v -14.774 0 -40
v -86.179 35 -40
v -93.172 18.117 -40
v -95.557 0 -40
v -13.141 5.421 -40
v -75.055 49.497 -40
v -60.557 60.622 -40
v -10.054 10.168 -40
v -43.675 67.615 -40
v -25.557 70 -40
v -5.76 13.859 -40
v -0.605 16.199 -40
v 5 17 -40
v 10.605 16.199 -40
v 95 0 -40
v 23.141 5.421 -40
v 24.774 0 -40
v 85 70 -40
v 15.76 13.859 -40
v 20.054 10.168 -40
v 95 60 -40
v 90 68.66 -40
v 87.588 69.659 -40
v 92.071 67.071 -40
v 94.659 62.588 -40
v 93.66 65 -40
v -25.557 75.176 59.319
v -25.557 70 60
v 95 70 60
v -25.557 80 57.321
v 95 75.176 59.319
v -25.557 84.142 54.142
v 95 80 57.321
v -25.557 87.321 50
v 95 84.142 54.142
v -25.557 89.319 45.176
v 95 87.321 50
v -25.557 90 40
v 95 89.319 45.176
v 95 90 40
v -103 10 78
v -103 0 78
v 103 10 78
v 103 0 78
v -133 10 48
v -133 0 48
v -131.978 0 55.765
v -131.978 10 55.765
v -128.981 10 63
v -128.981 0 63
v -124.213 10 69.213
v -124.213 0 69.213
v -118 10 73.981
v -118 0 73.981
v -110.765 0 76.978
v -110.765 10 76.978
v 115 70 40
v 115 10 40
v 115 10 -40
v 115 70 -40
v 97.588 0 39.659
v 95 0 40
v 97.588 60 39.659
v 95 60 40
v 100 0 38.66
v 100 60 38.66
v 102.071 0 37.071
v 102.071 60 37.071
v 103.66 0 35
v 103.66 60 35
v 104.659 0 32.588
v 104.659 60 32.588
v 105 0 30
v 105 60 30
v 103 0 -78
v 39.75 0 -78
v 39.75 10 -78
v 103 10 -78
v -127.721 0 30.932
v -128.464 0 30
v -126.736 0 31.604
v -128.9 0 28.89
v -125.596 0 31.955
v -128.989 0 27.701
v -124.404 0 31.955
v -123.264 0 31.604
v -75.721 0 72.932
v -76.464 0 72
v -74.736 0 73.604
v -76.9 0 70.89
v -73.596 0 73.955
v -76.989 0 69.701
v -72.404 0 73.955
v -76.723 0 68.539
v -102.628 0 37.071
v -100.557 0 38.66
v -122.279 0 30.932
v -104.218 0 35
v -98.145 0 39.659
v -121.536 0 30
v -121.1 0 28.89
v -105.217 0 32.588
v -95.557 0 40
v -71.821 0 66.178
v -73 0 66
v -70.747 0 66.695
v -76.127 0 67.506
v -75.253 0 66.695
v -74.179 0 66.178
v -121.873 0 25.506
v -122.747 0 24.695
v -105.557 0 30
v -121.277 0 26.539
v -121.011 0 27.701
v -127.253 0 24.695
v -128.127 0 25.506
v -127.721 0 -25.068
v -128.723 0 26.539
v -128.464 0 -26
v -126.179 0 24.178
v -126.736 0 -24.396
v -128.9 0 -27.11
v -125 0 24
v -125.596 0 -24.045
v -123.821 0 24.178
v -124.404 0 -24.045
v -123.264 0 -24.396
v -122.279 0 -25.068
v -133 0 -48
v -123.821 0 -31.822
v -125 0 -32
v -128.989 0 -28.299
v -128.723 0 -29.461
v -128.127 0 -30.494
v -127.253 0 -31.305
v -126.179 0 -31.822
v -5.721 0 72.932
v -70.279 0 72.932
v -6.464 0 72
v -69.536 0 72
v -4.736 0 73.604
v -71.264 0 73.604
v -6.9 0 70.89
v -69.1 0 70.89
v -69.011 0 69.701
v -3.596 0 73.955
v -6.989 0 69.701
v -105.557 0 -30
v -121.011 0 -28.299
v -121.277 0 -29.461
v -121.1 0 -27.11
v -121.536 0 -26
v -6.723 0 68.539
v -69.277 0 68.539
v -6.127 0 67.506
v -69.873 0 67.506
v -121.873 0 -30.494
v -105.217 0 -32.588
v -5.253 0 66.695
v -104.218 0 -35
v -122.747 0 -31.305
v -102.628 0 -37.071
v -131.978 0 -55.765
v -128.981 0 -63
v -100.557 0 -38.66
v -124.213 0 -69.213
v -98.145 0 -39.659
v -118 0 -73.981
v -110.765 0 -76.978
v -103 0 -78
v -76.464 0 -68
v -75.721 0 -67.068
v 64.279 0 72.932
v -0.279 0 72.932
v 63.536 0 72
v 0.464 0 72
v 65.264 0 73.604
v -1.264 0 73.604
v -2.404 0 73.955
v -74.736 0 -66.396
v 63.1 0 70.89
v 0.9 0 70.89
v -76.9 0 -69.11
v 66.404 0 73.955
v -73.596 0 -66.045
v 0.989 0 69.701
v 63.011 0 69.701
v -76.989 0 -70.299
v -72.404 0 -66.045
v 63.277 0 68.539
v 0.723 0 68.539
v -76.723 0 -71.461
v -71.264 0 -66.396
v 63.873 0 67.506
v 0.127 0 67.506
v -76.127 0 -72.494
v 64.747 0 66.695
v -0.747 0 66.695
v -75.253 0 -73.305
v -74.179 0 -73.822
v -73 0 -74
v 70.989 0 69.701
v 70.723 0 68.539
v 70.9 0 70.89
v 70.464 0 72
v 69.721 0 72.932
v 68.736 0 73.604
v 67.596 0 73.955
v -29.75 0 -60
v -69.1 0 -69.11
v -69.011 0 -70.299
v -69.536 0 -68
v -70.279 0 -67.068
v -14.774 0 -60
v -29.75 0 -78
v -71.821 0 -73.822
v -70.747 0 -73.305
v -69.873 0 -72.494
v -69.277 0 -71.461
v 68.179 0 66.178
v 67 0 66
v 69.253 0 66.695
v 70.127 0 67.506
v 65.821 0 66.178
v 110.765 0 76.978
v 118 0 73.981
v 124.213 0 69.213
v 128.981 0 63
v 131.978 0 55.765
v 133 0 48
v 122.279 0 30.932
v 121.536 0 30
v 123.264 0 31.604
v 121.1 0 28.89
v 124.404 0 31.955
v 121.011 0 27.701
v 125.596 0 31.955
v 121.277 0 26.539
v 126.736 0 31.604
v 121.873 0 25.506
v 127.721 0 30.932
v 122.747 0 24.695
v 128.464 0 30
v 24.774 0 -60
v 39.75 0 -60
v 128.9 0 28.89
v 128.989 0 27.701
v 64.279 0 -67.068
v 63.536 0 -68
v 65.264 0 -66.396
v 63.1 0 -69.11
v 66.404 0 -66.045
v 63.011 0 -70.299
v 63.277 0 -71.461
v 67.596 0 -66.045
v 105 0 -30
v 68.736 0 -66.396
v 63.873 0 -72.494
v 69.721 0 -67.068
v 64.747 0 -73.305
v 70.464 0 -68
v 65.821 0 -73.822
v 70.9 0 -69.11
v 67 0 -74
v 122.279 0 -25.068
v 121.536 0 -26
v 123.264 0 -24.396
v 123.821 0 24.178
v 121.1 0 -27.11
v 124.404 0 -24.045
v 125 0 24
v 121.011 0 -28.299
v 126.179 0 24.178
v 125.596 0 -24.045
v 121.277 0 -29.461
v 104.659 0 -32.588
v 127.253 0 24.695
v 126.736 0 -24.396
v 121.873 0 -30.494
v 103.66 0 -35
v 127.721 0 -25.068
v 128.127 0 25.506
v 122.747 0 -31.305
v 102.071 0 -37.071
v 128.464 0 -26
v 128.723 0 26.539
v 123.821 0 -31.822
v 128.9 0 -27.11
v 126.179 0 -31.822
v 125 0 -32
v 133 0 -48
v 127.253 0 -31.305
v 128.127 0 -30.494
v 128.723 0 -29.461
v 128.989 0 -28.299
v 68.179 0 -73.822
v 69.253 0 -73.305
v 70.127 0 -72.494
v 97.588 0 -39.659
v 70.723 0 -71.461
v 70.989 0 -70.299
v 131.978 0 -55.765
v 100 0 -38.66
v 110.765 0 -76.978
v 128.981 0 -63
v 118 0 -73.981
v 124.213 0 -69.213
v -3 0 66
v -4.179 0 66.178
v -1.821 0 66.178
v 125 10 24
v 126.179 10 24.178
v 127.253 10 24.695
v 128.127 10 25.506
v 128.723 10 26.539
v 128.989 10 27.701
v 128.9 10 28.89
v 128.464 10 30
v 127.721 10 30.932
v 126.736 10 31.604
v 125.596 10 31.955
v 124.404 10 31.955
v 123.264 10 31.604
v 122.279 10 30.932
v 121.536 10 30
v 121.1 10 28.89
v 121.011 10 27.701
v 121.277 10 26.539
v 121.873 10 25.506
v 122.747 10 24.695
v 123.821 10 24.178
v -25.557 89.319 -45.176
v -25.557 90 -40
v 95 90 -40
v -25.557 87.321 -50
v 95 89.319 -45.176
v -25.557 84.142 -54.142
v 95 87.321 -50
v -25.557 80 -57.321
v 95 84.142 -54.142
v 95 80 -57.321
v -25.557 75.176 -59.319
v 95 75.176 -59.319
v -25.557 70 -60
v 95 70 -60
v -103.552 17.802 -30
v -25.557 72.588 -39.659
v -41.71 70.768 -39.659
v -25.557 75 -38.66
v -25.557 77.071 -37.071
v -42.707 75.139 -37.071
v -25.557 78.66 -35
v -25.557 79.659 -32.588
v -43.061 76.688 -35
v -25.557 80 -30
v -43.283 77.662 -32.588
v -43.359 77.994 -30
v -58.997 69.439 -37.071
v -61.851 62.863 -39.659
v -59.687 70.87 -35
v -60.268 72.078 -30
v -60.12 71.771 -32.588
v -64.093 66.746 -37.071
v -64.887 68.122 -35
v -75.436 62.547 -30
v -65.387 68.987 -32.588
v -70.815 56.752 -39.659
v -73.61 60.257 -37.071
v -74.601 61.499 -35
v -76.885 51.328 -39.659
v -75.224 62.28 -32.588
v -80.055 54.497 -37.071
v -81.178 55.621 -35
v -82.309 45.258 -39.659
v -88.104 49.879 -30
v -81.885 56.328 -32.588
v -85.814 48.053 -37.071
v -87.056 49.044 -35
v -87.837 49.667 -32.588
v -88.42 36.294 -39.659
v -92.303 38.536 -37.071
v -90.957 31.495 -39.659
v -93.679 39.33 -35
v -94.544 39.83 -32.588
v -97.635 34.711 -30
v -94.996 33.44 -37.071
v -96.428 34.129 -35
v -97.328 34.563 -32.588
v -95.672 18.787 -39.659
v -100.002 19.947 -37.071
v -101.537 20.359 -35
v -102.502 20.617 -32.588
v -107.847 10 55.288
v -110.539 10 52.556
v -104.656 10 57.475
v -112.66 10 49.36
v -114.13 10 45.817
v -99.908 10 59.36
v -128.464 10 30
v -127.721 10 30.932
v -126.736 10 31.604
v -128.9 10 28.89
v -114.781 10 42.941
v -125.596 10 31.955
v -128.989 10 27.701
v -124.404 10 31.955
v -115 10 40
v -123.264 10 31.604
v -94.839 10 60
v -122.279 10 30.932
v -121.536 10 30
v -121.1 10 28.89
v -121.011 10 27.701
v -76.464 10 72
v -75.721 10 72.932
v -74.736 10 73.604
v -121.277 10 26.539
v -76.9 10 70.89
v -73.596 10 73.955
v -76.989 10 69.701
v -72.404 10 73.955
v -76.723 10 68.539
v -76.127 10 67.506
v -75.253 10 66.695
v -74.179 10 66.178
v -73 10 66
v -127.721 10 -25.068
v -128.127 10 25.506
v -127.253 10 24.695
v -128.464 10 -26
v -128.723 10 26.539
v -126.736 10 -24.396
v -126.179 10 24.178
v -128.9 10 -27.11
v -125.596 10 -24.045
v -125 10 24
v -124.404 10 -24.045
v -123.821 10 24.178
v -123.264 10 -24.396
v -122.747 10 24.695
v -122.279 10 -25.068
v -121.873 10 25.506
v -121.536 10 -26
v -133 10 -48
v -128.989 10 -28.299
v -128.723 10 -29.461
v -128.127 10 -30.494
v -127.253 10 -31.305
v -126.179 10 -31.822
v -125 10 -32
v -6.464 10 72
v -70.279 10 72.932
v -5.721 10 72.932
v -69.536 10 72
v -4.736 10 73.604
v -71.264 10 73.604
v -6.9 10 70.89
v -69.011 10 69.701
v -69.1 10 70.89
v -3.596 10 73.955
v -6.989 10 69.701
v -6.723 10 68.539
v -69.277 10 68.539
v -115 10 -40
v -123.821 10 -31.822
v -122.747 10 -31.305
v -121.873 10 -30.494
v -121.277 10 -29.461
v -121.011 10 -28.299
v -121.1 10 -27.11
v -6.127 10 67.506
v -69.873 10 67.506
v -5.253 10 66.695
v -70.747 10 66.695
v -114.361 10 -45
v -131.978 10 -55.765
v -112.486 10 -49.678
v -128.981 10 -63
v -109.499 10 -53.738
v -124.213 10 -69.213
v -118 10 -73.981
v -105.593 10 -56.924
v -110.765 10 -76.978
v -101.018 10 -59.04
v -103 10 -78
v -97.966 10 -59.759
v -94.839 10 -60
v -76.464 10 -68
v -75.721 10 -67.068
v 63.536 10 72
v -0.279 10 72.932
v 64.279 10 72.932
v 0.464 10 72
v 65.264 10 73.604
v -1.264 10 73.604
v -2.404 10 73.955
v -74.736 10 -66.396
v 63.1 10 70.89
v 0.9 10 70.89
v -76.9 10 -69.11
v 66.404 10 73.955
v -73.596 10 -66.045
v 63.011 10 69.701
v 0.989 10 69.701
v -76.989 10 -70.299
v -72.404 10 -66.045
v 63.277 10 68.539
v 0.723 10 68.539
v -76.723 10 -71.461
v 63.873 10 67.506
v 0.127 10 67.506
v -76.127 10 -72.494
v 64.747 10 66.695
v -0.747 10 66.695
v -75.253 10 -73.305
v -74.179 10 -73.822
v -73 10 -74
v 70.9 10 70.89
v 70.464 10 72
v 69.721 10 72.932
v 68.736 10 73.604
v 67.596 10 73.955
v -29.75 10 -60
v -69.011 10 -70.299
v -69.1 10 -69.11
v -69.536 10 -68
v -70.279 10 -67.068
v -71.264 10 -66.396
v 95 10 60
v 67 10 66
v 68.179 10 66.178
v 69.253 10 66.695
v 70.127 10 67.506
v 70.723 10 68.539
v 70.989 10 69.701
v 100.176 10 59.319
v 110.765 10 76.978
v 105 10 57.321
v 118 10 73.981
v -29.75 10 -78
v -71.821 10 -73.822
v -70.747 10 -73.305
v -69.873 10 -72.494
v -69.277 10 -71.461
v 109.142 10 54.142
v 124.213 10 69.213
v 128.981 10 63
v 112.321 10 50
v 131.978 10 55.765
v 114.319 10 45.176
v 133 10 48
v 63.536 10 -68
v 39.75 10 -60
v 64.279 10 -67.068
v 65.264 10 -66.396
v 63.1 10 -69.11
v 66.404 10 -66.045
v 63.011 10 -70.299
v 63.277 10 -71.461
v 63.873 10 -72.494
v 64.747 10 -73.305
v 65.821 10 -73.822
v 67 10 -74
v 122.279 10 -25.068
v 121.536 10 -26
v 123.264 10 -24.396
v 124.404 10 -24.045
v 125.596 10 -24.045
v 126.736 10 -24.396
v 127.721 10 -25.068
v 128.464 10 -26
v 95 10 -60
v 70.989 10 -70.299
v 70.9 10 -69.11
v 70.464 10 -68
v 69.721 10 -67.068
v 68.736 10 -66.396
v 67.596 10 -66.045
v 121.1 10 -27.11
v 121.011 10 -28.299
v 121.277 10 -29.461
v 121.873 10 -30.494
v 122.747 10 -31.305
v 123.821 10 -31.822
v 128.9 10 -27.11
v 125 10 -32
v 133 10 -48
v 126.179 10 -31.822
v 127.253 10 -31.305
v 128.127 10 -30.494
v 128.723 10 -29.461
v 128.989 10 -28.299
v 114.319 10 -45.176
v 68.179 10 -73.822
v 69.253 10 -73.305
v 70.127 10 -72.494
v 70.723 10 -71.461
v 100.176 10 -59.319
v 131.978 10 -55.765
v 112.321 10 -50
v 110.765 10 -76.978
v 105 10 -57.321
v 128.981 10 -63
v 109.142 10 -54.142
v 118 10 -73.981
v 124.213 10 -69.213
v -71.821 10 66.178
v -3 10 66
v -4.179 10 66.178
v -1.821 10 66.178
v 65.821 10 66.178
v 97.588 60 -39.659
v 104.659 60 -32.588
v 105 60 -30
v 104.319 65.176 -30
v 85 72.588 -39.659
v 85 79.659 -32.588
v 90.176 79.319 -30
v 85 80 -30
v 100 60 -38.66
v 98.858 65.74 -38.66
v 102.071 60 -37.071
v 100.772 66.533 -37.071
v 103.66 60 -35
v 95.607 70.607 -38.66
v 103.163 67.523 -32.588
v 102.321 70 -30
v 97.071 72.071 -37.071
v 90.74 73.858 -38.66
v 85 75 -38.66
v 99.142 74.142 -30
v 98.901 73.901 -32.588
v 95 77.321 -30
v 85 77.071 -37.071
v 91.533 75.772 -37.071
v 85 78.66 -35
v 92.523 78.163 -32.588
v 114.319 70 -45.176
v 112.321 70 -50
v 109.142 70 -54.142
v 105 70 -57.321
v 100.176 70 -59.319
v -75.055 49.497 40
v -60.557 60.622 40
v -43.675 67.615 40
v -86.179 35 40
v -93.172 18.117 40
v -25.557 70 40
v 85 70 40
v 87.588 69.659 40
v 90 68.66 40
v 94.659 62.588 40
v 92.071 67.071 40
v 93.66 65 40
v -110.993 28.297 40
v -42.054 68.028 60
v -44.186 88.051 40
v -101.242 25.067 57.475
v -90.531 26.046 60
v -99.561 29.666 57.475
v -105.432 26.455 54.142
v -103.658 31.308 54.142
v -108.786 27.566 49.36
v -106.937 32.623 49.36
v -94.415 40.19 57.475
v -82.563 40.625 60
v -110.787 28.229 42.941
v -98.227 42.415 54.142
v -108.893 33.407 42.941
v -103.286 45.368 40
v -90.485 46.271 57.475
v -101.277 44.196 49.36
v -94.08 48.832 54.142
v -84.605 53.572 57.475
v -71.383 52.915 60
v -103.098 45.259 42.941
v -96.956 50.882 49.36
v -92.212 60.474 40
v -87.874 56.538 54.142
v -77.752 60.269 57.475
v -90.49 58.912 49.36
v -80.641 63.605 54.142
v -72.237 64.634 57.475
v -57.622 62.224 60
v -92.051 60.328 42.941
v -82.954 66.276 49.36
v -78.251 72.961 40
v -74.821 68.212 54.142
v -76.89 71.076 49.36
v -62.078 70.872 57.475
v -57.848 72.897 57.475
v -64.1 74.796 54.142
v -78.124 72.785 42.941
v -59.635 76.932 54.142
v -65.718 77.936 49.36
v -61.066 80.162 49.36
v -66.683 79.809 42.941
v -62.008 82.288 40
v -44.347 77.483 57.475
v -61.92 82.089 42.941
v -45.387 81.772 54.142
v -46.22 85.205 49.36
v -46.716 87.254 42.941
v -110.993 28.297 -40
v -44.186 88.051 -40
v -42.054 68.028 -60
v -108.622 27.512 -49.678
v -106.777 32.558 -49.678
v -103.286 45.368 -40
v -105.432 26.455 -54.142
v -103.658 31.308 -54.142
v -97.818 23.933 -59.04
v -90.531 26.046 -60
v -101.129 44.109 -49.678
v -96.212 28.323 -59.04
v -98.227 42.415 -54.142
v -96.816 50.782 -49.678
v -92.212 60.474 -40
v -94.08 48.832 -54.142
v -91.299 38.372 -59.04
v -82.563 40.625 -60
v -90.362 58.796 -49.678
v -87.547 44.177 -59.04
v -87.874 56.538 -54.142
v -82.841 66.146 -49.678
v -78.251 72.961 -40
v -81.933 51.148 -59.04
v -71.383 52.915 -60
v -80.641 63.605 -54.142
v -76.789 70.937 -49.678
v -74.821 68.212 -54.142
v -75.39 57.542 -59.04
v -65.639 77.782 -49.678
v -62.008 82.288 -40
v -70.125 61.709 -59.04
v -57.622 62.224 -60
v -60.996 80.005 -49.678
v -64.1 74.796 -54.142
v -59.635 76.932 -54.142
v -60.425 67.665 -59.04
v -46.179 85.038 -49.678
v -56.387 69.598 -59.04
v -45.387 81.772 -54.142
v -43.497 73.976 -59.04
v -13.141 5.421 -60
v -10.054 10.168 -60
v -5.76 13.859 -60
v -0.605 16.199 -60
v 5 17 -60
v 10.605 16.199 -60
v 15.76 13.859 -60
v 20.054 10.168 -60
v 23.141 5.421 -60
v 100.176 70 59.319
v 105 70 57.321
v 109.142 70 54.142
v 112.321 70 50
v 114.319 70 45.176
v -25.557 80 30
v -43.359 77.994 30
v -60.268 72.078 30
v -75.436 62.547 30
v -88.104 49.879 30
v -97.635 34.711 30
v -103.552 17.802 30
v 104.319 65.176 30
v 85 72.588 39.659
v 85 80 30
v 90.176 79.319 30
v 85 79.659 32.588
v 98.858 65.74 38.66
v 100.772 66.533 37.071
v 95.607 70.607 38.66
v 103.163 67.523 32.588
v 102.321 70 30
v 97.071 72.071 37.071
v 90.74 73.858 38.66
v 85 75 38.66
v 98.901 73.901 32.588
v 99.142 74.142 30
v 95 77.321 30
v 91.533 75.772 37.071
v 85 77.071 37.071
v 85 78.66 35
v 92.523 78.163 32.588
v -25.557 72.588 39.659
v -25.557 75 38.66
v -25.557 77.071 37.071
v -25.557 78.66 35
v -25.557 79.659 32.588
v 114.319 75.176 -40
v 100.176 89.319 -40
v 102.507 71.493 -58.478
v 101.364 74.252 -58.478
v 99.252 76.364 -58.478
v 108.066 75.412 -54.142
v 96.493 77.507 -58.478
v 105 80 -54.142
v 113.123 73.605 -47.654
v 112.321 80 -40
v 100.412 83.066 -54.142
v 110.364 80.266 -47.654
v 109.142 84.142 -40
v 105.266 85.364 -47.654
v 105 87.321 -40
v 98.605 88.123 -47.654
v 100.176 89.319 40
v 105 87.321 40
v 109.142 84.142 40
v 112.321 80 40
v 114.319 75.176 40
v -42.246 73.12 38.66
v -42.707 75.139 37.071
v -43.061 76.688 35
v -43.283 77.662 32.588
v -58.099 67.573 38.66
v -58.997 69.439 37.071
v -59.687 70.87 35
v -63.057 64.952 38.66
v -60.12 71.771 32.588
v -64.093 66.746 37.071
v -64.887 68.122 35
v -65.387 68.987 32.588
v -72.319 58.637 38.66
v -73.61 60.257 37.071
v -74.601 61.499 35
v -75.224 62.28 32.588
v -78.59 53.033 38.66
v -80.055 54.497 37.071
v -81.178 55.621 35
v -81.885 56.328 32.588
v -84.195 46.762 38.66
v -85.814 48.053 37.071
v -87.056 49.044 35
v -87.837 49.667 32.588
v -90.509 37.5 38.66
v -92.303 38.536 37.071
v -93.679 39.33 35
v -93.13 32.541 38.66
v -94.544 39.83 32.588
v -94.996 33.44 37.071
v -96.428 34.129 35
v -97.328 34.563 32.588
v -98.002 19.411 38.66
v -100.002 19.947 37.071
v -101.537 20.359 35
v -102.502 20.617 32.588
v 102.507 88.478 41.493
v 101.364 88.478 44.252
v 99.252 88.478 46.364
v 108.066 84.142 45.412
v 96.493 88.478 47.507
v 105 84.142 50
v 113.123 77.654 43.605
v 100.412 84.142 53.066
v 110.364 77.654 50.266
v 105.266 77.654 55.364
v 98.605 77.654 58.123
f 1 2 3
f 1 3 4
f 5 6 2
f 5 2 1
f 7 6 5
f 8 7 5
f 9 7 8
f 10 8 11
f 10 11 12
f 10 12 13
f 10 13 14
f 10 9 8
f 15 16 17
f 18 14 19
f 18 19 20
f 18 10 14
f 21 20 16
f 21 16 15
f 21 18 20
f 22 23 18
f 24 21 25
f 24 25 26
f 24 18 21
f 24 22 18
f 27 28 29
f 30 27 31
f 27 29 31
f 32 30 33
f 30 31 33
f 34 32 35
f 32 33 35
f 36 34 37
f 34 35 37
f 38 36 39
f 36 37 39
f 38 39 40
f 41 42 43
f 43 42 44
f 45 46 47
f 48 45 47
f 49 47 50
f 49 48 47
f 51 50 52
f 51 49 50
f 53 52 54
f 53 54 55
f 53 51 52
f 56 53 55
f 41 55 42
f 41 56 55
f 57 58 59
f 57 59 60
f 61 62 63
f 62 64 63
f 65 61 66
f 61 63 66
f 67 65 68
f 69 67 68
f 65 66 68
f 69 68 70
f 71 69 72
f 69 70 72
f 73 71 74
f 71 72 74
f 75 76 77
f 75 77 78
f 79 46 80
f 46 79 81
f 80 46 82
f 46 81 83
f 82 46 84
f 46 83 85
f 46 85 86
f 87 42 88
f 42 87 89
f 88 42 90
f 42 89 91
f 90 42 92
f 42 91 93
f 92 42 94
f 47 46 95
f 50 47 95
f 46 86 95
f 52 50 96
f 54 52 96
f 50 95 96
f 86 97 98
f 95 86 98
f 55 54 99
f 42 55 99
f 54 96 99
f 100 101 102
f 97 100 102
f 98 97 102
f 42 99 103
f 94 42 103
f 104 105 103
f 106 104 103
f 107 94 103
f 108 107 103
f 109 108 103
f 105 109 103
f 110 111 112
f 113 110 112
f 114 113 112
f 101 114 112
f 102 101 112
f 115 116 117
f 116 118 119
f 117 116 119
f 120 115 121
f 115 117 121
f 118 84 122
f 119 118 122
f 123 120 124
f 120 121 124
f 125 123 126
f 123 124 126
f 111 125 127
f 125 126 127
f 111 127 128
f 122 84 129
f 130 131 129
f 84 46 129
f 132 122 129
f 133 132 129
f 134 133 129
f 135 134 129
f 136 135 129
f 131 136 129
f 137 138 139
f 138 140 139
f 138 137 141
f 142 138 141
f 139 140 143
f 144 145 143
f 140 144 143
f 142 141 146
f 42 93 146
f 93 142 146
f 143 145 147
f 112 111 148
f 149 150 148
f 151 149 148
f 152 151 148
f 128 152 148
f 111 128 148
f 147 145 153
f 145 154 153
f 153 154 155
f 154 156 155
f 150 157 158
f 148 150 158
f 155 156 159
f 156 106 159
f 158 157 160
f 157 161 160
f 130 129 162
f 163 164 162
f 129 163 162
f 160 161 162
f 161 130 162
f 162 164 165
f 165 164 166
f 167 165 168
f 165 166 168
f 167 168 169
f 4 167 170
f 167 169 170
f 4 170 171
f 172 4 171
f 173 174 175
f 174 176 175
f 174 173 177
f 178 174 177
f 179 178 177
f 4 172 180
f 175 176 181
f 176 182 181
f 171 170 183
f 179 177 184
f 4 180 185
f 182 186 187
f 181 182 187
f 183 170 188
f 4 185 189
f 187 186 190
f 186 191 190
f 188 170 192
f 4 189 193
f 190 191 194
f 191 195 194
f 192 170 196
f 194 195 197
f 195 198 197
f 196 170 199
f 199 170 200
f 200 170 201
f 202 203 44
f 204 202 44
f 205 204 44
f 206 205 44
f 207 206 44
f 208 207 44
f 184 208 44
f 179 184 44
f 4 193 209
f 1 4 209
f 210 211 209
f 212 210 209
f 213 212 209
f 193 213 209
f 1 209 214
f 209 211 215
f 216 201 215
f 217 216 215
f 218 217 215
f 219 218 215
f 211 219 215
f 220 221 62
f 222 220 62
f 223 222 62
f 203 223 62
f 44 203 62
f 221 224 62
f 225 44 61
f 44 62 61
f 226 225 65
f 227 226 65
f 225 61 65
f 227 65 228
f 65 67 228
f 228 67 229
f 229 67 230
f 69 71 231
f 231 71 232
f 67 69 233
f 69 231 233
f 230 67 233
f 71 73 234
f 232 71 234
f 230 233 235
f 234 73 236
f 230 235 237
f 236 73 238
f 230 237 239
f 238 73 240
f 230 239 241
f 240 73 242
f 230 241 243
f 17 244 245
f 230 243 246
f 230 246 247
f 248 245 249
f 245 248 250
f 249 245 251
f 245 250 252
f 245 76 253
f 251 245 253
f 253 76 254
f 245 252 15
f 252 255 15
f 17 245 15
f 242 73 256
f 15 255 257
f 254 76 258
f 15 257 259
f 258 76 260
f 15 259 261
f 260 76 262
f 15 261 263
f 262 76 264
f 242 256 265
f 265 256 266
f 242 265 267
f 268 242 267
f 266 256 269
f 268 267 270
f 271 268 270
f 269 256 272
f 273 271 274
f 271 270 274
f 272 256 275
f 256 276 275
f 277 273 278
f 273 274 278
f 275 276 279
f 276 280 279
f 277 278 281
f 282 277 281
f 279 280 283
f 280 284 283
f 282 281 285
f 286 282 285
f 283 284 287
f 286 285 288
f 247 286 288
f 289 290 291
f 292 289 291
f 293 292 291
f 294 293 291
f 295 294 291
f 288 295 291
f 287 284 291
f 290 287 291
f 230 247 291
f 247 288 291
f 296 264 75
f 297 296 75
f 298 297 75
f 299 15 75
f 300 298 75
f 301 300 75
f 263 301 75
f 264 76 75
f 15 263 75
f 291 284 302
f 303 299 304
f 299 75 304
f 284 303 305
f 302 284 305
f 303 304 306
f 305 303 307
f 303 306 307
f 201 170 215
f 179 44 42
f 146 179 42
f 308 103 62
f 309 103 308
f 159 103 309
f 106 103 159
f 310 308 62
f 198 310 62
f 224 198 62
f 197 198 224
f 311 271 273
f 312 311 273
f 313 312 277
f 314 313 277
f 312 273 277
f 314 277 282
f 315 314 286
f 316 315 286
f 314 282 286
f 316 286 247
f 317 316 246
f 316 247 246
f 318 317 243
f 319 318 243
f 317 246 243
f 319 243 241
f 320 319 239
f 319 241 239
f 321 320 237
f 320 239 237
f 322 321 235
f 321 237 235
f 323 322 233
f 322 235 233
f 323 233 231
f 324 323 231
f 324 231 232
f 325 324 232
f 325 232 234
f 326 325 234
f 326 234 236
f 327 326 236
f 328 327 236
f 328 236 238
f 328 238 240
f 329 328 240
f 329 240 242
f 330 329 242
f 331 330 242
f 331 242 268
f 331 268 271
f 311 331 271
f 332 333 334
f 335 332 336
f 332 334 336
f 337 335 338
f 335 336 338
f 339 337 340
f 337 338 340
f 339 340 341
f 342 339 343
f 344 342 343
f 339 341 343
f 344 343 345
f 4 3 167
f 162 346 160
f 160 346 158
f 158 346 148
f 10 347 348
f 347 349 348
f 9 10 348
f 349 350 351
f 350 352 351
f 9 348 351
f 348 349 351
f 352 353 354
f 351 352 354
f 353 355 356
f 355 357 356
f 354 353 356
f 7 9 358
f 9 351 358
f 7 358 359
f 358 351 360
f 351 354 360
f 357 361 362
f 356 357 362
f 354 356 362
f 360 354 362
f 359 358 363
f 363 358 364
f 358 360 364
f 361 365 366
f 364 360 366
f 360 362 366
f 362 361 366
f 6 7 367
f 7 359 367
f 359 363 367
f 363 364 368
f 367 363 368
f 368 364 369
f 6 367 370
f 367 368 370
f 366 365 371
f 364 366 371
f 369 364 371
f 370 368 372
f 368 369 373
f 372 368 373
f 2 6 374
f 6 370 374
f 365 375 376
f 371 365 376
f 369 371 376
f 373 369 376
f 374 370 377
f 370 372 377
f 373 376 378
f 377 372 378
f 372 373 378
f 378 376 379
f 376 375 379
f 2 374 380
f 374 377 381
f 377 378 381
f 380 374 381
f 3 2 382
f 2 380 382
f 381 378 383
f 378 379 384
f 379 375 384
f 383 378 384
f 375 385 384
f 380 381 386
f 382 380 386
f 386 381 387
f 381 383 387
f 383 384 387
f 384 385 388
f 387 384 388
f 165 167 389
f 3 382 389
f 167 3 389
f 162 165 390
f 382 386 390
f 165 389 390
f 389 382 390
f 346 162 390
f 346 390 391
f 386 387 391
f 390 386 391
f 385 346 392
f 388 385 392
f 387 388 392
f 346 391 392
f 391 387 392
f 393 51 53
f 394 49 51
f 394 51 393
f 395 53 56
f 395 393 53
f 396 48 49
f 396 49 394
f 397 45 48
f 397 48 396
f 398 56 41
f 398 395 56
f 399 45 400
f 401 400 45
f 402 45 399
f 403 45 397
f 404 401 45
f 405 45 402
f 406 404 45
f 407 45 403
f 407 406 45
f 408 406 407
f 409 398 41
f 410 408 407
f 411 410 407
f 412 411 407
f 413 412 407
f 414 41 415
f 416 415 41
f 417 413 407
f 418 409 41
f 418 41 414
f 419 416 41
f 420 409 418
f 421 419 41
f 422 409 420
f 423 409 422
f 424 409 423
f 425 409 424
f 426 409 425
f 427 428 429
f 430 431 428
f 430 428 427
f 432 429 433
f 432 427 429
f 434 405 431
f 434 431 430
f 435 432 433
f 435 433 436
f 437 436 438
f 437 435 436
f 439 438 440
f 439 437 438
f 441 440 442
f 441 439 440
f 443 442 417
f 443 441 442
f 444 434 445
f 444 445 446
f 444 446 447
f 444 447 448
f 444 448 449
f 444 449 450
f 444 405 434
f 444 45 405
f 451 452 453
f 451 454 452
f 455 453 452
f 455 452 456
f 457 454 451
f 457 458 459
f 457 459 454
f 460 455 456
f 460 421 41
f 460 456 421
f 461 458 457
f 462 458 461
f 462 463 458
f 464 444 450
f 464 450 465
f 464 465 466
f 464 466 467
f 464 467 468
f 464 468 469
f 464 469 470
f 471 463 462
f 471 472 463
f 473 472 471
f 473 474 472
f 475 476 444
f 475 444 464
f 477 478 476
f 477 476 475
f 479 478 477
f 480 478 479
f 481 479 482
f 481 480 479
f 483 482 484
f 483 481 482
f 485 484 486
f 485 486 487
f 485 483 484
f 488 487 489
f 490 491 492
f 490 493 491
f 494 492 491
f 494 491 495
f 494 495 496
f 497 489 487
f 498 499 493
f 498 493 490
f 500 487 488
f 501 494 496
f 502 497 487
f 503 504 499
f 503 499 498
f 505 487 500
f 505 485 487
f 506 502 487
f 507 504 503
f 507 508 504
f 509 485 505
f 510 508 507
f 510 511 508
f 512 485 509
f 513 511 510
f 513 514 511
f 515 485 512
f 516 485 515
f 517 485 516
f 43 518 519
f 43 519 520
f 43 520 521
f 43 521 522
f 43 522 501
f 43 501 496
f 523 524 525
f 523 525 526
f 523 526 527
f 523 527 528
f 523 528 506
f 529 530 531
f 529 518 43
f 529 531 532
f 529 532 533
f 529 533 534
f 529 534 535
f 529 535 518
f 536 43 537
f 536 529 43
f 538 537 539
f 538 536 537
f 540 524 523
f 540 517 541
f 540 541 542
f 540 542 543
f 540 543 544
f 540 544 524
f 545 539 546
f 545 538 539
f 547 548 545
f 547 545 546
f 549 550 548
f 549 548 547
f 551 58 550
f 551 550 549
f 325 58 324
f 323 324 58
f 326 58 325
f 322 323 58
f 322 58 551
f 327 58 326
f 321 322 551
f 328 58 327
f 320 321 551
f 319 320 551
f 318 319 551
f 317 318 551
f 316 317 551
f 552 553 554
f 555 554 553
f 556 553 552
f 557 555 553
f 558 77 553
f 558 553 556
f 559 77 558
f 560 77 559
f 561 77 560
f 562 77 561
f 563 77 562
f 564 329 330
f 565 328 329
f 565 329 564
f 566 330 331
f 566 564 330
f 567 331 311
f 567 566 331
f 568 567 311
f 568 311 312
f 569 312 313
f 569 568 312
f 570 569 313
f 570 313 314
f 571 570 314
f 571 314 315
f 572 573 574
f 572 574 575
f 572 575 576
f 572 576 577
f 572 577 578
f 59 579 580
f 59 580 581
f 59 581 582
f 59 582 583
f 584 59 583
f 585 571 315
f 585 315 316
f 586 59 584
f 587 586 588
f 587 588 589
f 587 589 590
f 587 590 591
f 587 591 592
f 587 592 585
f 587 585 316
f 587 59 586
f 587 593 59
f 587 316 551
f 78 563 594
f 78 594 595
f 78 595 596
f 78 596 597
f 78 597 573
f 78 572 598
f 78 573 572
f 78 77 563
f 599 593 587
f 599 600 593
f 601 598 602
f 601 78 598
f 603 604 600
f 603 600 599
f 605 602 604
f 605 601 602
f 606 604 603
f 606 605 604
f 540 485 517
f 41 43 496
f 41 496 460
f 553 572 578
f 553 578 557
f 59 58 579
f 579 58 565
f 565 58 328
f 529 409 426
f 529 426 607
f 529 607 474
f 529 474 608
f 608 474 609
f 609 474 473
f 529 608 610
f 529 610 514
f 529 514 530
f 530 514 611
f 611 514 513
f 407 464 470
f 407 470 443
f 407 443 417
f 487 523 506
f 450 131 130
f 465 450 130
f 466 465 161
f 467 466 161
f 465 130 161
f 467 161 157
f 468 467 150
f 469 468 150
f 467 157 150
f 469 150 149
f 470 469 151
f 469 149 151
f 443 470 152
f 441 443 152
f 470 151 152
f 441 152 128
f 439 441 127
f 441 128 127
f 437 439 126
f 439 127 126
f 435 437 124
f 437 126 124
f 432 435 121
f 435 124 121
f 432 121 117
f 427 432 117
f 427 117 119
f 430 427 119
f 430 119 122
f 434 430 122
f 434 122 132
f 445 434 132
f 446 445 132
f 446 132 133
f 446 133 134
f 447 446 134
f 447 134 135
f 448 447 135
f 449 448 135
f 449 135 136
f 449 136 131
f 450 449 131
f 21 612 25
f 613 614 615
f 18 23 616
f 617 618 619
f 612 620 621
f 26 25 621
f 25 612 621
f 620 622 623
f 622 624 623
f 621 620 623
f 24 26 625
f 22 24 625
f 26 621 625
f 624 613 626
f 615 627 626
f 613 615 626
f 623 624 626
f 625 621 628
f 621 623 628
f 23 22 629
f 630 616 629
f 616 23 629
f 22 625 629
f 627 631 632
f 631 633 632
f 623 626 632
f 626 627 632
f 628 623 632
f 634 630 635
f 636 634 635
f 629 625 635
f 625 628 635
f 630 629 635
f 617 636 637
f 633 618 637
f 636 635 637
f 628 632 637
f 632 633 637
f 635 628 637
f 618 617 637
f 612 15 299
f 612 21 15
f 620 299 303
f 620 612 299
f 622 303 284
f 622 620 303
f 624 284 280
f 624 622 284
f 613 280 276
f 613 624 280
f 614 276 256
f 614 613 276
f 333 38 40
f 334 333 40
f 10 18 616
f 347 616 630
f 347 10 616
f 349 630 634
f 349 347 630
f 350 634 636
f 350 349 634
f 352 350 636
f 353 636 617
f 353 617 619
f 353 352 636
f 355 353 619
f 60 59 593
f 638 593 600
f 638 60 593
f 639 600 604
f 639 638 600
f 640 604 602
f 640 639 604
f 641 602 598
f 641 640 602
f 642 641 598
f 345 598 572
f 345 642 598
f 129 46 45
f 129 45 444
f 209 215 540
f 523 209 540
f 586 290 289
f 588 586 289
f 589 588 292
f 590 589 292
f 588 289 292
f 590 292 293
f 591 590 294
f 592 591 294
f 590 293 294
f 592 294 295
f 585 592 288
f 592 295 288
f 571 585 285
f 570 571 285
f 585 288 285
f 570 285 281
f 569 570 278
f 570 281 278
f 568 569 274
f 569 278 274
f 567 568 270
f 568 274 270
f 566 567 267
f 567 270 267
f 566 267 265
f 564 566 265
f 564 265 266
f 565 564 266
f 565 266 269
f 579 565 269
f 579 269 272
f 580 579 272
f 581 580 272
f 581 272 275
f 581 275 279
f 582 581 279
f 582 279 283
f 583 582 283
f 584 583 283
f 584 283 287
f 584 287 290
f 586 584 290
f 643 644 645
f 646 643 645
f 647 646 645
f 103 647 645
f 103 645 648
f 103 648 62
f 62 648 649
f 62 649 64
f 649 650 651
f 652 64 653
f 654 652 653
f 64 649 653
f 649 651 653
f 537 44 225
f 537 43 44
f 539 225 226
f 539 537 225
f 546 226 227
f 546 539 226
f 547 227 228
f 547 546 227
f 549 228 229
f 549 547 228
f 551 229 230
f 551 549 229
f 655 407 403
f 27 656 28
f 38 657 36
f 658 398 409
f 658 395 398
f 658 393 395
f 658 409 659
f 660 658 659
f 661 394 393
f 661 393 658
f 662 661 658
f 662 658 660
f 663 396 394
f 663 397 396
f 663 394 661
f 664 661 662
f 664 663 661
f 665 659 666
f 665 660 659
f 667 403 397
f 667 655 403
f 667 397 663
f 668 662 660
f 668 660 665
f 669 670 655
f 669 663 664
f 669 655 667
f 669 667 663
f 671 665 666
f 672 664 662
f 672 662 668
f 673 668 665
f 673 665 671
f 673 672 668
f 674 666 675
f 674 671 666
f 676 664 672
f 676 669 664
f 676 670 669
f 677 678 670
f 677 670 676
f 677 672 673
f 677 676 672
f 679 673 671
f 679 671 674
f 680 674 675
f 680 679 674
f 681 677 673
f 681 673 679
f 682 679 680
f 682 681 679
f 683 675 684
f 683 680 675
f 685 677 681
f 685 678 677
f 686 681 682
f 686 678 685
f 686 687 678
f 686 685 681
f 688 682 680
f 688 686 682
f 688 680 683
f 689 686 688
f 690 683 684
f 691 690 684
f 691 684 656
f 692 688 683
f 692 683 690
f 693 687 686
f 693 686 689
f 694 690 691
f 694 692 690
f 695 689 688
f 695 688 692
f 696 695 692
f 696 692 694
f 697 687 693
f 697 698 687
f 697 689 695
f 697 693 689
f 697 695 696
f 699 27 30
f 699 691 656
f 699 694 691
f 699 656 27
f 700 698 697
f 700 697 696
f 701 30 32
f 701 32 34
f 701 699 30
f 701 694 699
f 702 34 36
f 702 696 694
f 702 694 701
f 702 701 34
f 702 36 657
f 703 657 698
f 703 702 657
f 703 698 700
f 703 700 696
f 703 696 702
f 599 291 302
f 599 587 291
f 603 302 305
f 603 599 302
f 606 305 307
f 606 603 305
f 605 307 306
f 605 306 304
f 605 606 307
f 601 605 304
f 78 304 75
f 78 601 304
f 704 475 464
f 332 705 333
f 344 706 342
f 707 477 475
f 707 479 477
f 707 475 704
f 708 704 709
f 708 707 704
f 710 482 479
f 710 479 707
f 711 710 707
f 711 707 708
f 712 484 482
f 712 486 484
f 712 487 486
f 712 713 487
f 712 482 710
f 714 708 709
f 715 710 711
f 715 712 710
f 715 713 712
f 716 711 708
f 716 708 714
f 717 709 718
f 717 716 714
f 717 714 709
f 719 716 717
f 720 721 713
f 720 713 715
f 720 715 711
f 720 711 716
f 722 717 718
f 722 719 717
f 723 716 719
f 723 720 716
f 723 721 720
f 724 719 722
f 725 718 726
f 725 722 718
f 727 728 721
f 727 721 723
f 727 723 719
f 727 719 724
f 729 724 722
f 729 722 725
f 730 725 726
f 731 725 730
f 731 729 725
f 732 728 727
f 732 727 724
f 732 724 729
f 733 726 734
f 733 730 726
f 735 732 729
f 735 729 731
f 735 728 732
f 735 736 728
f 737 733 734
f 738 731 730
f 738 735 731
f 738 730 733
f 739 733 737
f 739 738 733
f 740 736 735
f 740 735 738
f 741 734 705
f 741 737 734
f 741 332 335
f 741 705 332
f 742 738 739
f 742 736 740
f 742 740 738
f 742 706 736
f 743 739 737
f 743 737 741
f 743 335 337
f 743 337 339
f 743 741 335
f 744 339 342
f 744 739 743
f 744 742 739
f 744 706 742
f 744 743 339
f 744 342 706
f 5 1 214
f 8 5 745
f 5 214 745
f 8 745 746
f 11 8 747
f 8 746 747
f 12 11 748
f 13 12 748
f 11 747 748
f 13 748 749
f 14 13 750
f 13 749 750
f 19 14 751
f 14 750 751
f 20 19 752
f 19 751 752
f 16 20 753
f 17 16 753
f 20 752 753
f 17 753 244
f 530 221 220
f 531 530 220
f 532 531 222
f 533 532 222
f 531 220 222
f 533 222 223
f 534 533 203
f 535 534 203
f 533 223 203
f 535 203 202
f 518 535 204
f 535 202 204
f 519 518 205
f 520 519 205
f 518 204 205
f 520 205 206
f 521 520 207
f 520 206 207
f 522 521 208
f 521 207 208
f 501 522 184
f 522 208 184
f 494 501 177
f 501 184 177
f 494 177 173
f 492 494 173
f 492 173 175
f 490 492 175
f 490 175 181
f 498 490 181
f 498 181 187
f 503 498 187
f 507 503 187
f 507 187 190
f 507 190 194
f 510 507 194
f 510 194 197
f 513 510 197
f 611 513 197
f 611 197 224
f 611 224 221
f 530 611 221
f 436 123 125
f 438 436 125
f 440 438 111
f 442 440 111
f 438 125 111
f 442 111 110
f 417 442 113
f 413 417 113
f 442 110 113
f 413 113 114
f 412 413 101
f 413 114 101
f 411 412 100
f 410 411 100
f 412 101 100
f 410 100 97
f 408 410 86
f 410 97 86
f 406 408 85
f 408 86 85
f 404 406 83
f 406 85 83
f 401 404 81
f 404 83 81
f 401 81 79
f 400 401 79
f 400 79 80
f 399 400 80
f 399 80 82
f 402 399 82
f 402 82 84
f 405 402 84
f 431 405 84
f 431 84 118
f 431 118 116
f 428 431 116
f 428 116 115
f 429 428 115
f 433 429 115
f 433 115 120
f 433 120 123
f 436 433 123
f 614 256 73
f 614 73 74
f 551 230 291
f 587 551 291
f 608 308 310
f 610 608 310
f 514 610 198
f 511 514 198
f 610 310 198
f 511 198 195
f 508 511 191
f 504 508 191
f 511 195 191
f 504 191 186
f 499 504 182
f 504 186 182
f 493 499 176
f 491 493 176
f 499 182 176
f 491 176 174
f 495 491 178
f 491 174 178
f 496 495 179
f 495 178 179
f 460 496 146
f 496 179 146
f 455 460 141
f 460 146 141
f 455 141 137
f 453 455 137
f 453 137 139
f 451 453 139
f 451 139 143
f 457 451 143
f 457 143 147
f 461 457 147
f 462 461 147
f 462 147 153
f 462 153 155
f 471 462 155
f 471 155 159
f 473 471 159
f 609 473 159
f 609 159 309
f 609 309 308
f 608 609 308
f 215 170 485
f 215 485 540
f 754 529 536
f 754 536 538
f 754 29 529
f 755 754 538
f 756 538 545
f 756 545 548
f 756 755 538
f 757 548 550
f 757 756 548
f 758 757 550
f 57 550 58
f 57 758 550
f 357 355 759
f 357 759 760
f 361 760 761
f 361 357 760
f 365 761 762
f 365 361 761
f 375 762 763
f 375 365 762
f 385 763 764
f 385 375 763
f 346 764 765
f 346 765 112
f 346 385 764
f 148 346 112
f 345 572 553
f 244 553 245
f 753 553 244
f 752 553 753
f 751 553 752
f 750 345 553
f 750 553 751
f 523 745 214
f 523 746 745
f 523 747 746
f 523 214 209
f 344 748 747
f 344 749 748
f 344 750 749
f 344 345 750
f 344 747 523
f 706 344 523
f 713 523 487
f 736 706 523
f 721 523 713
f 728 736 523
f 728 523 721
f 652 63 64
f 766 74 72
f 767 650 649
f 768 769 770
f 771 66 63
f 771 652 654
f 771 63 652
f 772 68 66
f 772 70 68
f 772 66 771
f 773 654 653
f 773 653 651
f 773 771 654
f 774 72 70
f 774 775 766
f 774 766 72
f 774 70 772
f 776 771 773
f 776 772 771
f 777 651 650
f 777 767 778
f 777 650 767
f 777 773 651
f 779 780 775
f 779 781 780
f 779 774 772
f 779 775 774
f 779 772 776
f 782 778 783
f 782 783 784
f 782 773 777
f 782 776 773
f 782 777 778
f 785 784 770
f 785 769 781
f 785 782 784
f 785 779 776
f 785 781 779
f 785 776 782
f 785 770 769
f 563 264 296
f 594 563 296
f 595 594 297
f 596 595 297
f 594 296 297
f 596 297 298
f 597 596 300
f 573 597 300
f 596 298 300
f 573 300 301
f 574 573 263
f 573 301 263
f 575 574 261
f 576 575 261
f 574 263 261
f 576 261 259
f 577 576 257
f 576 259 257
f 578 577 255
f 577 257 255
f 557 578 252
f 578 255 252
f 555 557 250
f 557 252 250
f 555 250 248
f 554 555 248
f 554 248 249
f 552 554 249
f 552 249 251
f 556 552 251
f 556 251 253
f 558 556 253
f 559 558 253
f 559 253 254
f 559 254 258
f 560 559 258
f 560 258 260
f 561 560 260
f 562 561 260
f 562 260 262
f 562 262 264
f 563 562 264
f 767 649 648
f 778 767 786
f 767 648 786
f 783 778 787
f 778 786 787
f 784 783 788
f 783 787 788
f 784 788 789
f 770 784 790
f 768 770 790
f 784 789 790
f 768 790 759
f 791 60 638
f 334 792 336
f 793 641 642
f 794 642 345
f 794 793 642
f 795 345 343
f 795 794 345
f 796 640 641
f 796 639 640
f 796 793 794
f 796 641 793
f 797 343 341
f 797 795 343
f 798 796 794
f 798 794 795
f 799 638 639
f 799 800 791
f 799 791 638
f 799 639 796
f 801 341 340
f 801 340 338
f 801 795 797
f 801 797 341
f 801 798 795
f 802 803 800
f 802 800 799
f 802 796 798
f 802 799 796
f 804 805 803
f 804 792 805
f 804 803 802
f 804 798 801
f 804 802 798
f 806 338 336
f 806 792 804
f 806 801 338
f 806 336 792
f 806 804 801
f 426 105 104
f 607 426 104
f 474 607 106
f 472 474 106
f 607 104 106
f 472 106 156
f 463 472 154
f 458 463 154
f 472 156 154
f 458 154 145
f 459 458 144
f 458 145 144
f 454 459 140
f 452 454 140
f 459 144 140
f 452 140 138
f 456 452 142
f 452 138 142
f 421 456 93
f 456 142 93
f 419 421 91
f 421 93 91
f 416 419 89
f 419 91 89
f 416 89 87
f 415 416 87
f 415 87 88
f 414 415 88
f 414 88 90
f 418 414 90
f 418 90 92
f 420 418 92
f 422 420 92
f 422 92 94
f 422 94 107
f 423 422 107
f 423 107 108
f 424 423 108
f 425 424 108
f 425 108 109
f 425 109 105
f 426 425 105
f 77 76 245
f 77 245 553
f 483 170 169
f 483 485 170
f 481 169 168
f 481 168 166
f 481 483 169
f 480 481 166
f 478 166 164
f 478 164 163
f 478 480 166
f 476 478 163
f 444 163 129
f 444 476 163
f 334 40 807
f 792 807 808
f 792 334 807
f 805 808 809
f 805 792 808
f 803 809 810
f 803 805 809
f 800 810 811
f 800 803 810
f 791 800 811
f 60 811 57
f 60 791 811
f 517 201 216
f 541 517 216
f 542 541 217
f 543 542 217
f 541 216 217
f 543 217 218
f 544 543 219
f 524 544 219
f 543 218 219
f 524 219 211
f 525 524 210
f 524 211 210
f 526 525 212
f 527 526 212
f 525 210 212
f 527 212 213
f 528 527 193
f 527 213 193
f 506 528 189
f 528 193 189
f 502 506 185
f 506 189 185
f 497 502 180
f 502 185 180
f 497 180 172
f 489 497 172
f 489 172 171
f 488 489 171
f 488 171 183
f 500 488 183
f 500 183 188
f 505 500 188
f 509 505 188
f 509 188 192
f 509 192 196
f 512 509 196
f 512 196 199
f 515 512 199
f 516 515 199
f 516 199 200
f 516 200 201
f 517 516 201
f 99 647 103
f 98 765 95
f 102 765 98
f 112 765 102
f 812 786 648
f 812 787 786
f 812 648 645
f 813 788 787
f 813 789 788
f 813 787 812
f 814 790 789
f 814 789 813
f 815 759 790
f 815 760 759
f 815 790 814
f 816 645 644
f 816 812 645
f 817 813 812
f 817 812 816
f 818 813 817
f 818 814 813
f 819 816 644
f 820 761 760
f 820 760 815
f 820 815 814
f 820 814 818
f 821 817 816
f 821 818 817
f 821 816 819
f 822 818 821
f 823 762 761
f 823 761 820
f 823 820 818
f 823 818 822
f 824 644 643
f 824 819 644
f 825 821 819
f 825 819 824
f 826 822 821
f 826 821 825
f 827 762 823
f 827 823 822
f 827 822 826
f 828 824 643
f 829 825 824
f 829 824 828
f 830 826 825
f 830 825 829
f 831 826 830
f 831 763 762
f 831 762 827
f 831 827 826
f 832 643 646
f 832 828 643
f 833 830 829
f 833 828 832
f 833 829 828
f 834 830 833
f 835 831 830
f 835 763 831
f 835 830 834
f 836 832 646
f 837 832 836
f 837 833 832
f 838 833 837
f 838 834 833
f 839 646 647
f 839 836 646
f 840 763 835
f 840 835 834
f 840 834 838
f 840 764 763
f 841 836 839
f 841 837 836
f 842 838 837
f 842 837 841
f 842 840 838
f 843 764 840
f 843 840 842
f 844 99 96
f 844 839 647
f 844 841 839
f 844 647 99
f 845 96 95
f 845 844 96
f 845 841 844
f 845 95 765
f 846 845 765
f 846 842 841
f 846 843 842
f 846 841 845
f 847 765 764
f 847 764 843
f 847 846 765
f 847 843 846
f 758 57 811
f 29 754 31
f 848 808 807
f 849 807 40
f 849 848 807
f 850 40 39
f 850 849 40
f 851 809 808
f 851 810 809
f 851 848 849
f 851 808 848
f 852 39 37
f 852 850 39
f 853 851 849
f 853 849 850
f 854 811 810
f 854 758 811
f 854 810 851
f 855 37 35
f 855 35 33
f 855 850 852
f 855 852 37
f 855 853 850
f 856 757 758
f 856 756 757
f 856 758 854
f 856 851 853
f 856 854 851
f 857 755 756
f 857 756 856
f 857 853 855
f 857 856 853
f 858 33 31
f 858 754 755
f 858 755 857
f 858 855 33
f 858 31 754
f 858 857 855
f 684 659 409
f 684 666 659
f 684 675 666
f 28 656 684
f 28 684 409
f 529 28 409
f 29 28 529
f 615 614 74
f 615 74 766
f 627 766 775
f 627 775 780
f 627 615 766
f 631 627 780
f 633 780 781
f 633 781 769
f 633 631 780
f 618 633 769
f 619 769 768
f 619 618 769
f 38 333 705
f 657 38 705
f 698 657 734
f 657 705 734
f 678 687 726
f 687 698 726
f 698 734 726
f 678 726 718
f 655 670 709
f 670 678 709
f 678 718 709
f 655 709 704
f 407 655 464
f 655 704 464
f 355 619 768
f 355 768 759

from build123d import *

# Parameters (mm, degrees)
SKETCH1_W               = 266
SKETCH1_H               = 156
BOSS_EXTRUDE1_DEPTH     = 10
SKETCH2_W               = 230
SKETCH2_H               = 80
BOSS_EXTRUDE2_DEPTH     = 60
FILLET1_R               = 90
FILLET2_R               = 20
CUT_EXTRUDE1_DEPTH      = 40
CUT_EXTRUDE1_DEPTH_BACK = 40
FILLET3_R               = 10
CUT_EXTRUDE2_REACH      = 225.886
SKETCH4_R               = 20
SKETCH5_W               = 69.5
SKETCH5_H               = 38.16369677
CUT_EXTRUDE3_DEPTH      = 18
SKETCH6_R               = 4
CUT_EXTRUDE4_DEPTH      = 179.530109674
FILLET4_R               = 30


with BuildPart() as part:
    # Sketch1 → Boss-Extrude1 (new body)
    with BuildSketch(Plane(origin=(0, 0, 0), x_dir=(1, 0, 0), z_dir=(0, 1, 0))):
        Rectangle(SKETCH1_W, SKETCH1_H)
    extrude(amount=BOSS_EXTRUDE1_DEPTH)

    # Sketch2 → Boss-Extrude2 (add, symmetric)
    with BuildSketch(Plane.XY):
        with Locations((0, 50)):
            Rectangle(SKETCH2_W, SKETCH2_H)
    extrude(amount=BOSS_EXTRUDE2_DEPTH, both=True)

    # Fillet1
    # the kernel refuses this fillet: 90 mm, written as the material it takes off along each edge
    with BuildSketch(Plane(origin=(-115, 90, -283.60679775), x_dir=(0, -1, 0), z_dir=(0, 0, 1))) as fillet1_piece_1:
        with BuildLine():
            CenterArc((90, 89.4427191), FILLET1_R, 180, 83.620629792)
            Line((0, 89.4427191), (-1.8, 89.4427191))
            Line((-1.8, 89.4427191), (-1.8, 0))
            Line((-1.8, 0), (0, -1.8))
            ThreePointArc((0, -1.8), (40, -1.8), (79.8, -1.788854382))
            Line((79.8, -1.788854382), (80, 0))
        make_face()
    extrude(amount=567.2135955, mode=Mode.SUBTRACT)

    # Fillet2
    fillet2_edges = [part.edges().sort_by_distance(p)[0] for p in [
        (115, 50, 60),
        (115, 90, 0),
        (115, 50, -60),
        (44.72135955, 90, -60),
        (-85.5572809, 67.082039325, -60),
        (44.72135955, 90, 60),
        (-85.5572809, 67.082039325, 60),
    ]]
    fillet(fillet2_edges, radius=FILLET2_R)

    # Sketch3 → Cut-Extrude1 (cut, two sides: drawn at the far end of the back side and taken through both)
    with BuildSketch(Plane.XY.offset(-CUT_EXTRUDE1_DEPTH_BACK)):
        with BuildLine():
            Line((-105.5572809, 0), (105, 0))
            Line((105, 0), (105, 60))
            ThreePointArc((105, 60), (99.142135624, 74.142135624), (85, 80))
            Line((85, 80), (-25.5572809, 80))
            ThreePointArc((-25.5572809, 80), (-82.125823395, 56.568542495), (-105.5572809, 0))
        make_face()
    extrude(amount=CUT_EXTRUDE1_DEPTH + CUT_EXTRUDE1_DEPTH_BACK, mode=Mode.SUBTRACT)

    # Fillet3
    fillet3_edges = [part.edges().sort_by_distance(p)[0] for p in [
        (99.142135624, 74.142135624, -40),
        (105, 30, -40),
        (-82.125823395, 56.568542495, -40),
        (29.72135955, 80, -40),
        (105, 30, 40),
        (99.142135624, 74.142135624, 40),
        (29.72135955, 80, 40),
        (-82.125823395, 56.568542495, 40),
    ]]
    fillet(fillet3_edges, radius=FILLET3_R)

    # Sketch4 → Cut-Extrude2 (cut, up to next)
    with BuildSketch(Plane(origin=(0, 0, -78), x_dir=(-1, 0, 0), z_dir=(0, 0, -1)), mode=Mode.PRIVATE) as cut_extrude2_sk1:
        with Locations((-5, -3)):
            Circle(SKETCH4_R)
    cut_extrude2_tool1 = extrude(cut_extrude2_sk1.sketch, amount=-CUT_EXTRUDE2_REACH, mode=Mode.PRIVATE) & part.part
    add(cut_extrude2_tool1.solids().sort_by_distance((5, -3, -78))[0], mode=Mode.SUBTRACT)

    # Sketch5 → Cut-Extrude3 (cut)
    with BuildSketch(Plane(origin=(0, 0, -78), x_dir=(-1, 0, 0), z_dir=(0, 0, -1))):
        with Locations((-5, 0)):
            Rectangle(SKETCH5_W, SKETCH5_H)
    extrude(amount=-CUT_EXTRUDE3_DEPTH, mode=Mode.SUBTRACT)

    # Sketch6 → Cut-Extrude4 (cut, through all)
    with BuildSketch(Plane.XZ):
        with Locations(Location((-125, -28, 0), (0, 0, 270))):
            Circle(SKETCH6_R)
        with Locations(Location((125, -28, 0), (0, 0, 270))):
            Circle(SKETCH6_R)
        with Locations(Location((125, 28, 0), (0, 0, 270))):
            Circle(SKETCH6_R)
        with Locations(Location((-125, 28, 0), (0, 0, 270))):
            Circle(SKETCH6_R)
        with Locations(Location((-73, -70, 0), (0, 0, 270))):
            Circle(SKETCH6_R)
        with Locations(Location((67, -70, 0), (0, 0, 270))):
            Circle(SKETCH6_R)
        with Locations(Location((-3, 70, 0), (0, 0, 270))):
            Circle(SKETCH6_R)
        with Locations(Location((67, 70, 0), (0, 0, 270))):
            Circle(SKETCH6_R)
        with Locations(Location((-73, 70, 0), (0, 0, 270))):
            Circle(SKETCH6_R)
    extrude(amount=-CUT_EXTRUDE4_DEPTH, mode=Mode.SUBTRACT)

    # Fillet4
    fillet4_edges = [part.edges().sort_by_distance(p)[0] for p in [
        (133, 5, 78),
        (-133, 5, 78),
        (-133, 5, -78),
        (133, 5, -78),
    ]]
    fillet(fillet4_edges, radius=FILLET4_R)


solid = part.part
